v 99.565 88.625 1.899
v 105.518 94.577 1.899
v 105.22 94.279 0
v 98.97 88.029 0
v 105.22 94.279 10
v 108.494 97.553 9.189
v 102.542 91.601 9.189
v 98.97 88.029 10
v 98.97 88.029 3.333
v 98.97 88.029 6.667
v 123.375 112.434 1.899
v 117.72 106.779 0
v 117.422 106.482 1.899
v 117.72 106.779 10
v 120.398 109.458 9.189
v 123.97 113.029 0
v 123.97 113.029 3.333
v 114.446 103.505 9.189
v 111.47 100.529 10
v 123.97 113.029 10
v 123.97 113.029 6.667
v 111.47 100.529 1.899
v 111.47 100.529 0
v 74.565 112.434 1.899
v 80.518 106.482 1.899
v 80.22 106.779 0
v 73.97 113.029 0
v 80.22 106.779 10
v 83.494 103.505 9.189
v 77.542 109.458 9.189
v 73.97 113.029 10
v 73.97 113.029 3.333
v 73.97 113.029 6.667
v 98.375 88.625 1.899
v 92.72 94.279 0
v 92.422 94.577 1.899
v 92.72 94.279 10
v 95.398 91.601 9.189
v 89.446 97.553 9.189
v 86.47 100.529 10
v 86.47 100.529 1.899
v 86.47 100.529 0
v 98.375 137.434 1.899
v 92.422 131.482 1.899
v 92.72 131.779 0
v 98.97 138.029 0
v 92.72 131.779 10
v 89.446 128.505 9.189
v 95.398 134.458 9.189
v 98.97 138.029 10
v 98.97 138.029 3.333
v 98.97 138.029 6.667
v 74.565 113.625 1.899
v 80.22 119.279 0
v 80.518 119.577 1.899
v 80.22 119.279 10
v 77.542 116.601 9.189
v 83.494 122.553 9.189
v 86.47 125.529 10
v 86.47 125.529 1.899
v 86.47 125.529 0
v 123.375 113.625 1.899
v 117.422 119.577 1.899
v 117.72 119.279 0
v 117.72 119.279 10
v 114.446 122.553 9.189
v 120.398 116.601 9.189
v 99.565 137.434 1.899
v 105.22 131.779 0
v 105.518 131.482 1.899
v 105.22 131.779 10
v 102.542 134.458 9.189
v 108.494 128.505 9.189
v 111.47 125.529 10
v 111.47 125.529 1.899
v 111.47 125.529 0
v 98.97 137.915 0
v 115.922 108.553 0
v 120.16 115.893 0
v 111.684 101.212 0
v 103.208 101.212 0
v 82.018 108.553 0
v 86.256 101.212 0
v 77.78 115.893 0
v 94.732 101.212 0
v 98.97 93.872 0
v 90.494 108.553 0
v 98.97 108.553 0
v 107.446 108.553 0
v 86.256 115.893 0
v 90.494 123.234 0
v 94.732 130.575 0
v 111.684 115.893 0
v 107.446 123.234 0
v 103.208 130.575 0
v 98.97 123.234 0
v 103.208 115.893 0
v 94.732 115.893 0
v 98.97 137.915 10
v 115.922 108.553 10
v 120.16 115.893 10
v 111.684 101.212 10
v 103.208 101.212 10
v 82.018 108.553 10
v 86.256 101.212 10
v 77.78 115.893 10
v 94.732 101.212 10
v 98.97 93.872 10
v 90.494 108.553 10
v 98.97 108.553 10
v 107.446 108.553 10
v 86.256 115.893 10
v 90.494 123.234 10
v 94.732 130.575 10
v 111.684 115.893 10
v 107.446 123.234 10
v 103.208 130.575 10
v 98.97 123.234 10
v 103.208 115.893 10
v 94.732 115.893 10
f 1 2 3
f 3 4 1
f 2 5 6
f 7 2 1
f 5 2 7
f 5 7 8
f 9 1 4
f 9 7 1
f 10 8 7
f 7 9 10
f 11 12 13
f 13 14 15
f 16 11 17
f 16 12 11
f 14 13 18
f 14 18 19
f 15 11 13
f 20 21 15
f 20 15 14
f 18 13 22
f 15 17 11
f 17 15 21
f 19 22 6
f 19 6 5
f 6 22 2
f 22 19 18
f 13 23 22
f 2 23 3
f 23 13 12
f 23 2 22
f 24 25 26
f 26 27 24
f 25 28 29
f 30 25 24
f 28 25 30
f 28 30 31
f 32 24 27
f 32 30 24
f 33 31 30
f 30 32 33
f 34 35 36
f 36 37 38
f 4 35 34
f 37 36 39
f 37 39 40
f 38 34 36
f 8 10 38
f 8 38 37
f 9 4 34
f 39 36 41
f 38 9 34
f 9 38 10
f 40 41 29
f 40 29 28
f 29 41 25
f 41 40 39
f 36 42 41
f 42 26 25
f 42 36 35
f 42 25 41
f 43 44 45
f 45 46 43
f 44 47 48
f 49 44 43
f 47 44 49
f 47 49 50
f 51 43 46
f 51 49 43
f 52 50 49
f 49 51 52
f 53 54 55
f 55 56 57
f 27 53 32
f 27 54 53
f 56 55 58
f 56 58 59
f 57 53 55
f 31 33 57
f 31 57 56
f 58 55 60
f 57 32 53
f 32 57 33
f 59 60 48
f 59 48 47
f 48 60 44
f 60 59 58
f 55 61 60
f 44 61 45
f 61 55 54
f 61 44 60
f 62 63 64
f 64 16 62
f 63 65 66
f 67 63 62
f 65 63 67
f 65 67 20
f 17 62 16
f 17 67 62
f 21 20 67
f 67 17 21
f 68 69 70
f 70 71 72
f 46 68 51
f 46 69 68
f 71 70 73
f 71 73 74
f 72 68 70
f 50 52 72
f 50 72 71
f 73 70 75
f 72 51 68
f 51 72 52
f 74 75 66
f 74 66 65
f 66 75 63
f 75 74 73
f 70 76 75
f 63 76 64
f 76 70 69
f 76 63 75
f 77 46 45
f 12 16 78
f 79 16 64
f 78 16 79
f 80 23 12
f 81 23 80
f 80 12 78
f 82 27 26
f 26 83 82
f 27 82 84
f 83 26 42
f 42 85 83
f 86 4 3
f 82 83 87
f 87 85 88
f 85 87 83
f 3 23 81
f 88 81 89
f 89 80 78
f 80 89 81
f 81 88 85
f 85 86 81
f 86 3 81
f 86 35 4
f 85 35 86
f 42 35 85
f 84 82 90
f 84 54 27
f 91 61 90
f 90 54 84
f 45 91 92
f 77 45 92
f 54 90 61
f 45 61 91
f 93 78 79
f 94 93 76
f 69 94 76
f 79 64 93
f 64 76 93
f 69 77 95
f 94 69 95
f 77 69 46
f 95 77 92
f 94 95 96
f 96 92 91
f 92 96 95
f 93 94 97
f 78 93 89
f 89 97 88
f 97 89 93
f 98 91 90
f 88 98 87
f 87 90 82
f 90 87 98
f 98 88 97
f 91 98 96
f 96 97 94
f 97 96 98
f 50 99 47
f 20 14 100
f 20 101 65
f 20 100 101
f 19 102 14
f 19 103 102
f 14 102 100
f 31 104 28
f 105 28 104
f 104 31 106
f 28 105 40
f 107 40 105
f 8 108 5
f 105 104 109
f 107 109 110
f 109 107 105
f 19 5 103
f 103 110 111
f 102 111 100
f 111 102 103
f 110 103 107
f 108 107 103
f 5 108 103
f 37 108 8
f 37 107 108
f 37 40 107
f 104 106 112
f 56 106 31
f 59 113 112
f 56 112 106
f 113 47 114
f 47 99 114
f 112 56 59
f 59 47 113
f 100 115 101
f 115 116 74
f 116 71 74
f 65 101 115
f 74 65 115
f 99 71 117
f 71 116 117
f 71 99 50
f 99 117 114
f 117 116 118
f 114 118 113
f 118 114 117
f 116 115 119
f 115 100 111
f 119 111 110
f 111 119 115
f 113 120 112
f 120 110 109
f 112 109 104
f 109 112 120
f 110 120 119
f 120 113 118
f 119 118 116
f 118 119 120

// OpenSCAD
// CSG file generated from FreeCAD 0.20.29177 (Git)
group() {
 group(){
polyhedron ( points = [[123.970032,113.029228,0.000000],[123.970032,113.029228,10.000000],[98.970032,88.029228,0.000000],[98.970032,88.029228,10.000000],[73.970032,113.029228,0.000000],[73.970032,113.029228,10.000000],[98.970032,138.029236,0.000000],[98.970032,138.029236,10.000000],[123.970032,113.029228,3.333333],[123.970032,113.029228,6.666667],[98.970032,88.029228,3.333333],[98.970032,88.029228,6.666667],[117.720032,106.779228,0.000000],[111.470032,100.529228,0.000000],[105.220032,94.279228,0.000000],[117.720032,106.779228,10.000000],[111.470032,100.529228,10.000000],[105.220032,94.279228,10.000000],[73.970032,113.029228,3.333333],[73.970032,113.029228,6.666667],[92.720032,94.279228,0.000000],[86.470032,100.529228,0.000000],[80.220032,106.779228,0.000000],[92.720032,94.279228,10.000000],[86.470032,100.529228,10.000000],[80.220032,106.779228,10.000000],[98.970032,138.029236,3.333333],[98.970032,138.029236,6.666667],[80.220032,119.279228,0.000000],[86.470032,125.529228,0.000000],[92.720032,131.779236,0.000000],[80.220032,119.279228,10.000000],[86.470032,125.529228,10.000000],[92.720032,131.779236,10.000000],[105.220032,131.779236,0.000000],[111.470032,125.529228,0.000000],[117.720032,119.279228,0.000000],[105.220032,131.779236,10.000000],[111.470032,125.529228,10.000000],[117.720032,119.279228,10.000000],[105.517723,94.576920,1.899211],[117.422340,106.481544,1.899211],[99.565414,88.624611,1.899211],[102.541565,91.600769,9.189273],[108.493881,97.553078,9.189273],[123.374657,112.433853,1.899211],[114.446190,103.505386,9.189273],[120.398499,109.457695,9.189273],[111.470032,100.529228,1.899211],[80.517723,106.481544,1.899211],[92.422340,94.576920,1.899211],[74.565414,112.433853,1.899211],[77.541565,109.457695,9.189273],[83.493881,103.505386,9.189273],[98.374657,88.624611,1.899211],[89.446190,97.553078,9.189273],[95.398499,91.600769,9.189273],[86.470032,100.529228,1.899211],[92.422340,131.481537,1.899211],[80.517723,119.576920,1.899211],[98.374657,137.433853,1.899211],[95.398499,134.457703,9.189273],[89.446190,128.505386,9.189273],[74.565414,113.624611,1.899211],[83.493881,122.553078,9.189273],[77.541565,116.600769,9.189273],[86.470032,125.529228,1.899211],[117.422340,119.576920,1.899211],[105.517723,131.481537,1.899211],[123.374657,113.624611,1.899211],[120.398499,116.600769,9.189273],[114.446190,122.553078,9.189273],[99.565414,137.433853,1.899211],[108.493881,128.505386,9.189273],[102.541565,134.457703,9.189273],[111.470032,125.529228,1.899211],[82.017670,108.552750,0.000000],[115.922394,108.552750,0.000000],[98.970032,137.915100,0.000000],[98.970032,108.552750,0.000000],[90.493851,123.233925,0.000000],[107.446213,123.233925,0.000000],[120.160484,115.893333,0.000000],[111.684303,101.212158,0.000000],[77.779579,115.893333,0.000000],[86.255760,101.212158,0.000000],[98.970032,93.871574,0.000000],[94.731941,101.212158,0.000000],[90.493851,108.552750,0.000000],[103.208122,101.212158,0.000000],[107.446213,108.552750,0.000000],[86.255760,115.893333,0.000000],[94.731941,130.574509,0.000000],[111.684303,115.893333,0.000000],[103.208122,130.574509,0.000000],[98.970032,123.233925,0.000000],[103.208122,115.893333,0.000000],[94.731941,115.893333,0.000000],[82.017670,108.552750,10.000000],[115.922394,108.552750,10.000000],[98.970032,137.915100,10.000000],[98.970032,108.552750,10.000000],[90.493851,123.233925,10.000000],[107.446213,123.233925,10.000000],[120.160484,115.893333,10.000000],[111.684303,101.212158,10.000000],[77.779579,115.893333,10.000000],[86.255760,101.212158,10.000000],[98.970032,93.871574,10.000000],[94.731941,101.212158,10.000000],[90.493851,108.552750,10.000000],[103.208122,101.212158,10.000000],[107.446213,108.552750,10.000000],[86.255760,115.893333,10.000000],[94.731941,130.574509,10.000000],[111.684303,115.893333,10.000000],[103.208122,130.574509,10.000000],[98.970032,123.233925,10.000000],[103.208122,115.893333,10.000000],[94.731941,115.893333,10.000000]], faces = [[14,40,42],[42,2,14],[44,17,40],[42,40,43],[43,40,17],[3,43,17],[2,42,10],[42,43,10],[43,3,11],[11,10,43],[41,12,45],[47,15,41],[8,45,0],[45,12,0],[46,41,15],[16,46,15],[41,45,47],[47,9,1],[15,47,1],[48,41,46],[45,8,47],[9,47,8],[44,48,16],[17,44,16],[40,48,44],[46,16,48],[48,13,41],[14,13,40],[12,41,13],[48,40,13],[22,49,51],[51,4,22],[53,25,49],[51,49,52],[52,49,25],[5,52,25],[4,51,18],[51,52,18],[52,5,19],[19,18,52],[50,20,54],[56,23,50],[54,20,2],[55,50,23],[24,55,23],[50,54,56],[56,11,3],[23,56,3],[54,2,10],[57,50,55],[54,10,56],[11,56,10],[53,57,24],[25,53,24],[49,57,53],[55,24,57],[57,21,50],[49,22,21],[20,50,21],[57,49,21],[30,58,60],[60,6,30],[62,33,58],[60,58,61],[61,58,33],[7,61,33],[6,60,26],[60,61,26],[61,7,27],[27,26,61],[59,28,63],[65,31,59],[18,63,4],[63,28,4],[64,59,31],[32,64,31],[59,63,65],[65,19,5],[31,65,5],[66,59,64],[63,18,65],[19,65,18],[62,66,32],[33,62,32],[58,66,62],[64,32,66],[66,29,59],[30,29,58],[28,59,29],[66,58,29],[36,67,69],[69,0,36],[71,39,67],[69,67,70],[70,67,39],[1,70,39],[0,69,8],[69,70,8],[70,1,9],[9,8,70],[68,34,72],[74,37,68],[26,72,6],[72,34,6],[73,68,37],[38,73,37],[68,72,74],[74,27,7],[37,74,7],[75,68,73],[72,26,74],[27,74,26],[71,75,38],[39,71,38],[67,75,71],[73,38,75],[75,35,68],[36,35,67],[34,68,35],[75,67,35],[30,6,78],[77,0,12],[36,0,82],[82,0,77],[12,13,83],[83,13,89],[77,12,83],[22,4,76],[76,85,22],[84,76,4],[21,22,85],[85,87,21],[14,2,86],[88,85,76],[79,87,88],[85,88,87],[89,13,14],[90,89,79],[77,83,90],[89,90,83],[87,79,89],[89,86,87],[89,14,86],[2,20,86],[86,20,87],[87,20,21],[91,76,84],[4,28,84],[91,29,80],[84,28,91],[92,80,30],[92,30,78],[29,91,28],[80,29,30],[82,77,93],[35,93,81],[35,81,34],[93,36,82],[93,35,36],[94,78,34],[94,34,81],[6,34,78],[92,78,94],[95,94,81],[80,92,95],[94,95,92],[96,81,93],[90,93,77],[79,96,90],[93,90,96],[91,80,97],[88,97,79],[76,91,88],[97,88,91],[96,79,97],[95,97,80],[81,96,95],[97,95,96],[33,100,7],[99,15,1],[39,104,1],[104,99,1],[15,105,16],[105,111,16],[99,105,15],[25,98,5],[98,25,107],[106,5,98],[24,107,25],[107,24,109],[17,108,3],[110,98,107],[101,110,109],[107,109,110],[111,17,16],[112,101,111],[99,112,105],[111,105,112],[109,111,101],[111,109,108],[111,108,17],[3,108,23],[108,109,23],[109,24,23],[113,106,98],[5,106,31],[113,102,32],[106,113,31],[114,33,102],[114,100,33],[32,31,113],[102,33,32],[104,115,99],[38,103,115],[38,37,103],[115,104,39],[115,39,38],[116,37,100],[116,103,37],[7,100,37],[114,116,100],[117,103,116],[102,117,114],[116,114,117],[118,115,103],[112,99,115],[101,112,118],[115,118,112],[113,119,102],[110,101,119],[98,110,113],[119,113,110],[118,119,101],[117,102,119],[103,117,118],[119,118,117]]);
}
}
